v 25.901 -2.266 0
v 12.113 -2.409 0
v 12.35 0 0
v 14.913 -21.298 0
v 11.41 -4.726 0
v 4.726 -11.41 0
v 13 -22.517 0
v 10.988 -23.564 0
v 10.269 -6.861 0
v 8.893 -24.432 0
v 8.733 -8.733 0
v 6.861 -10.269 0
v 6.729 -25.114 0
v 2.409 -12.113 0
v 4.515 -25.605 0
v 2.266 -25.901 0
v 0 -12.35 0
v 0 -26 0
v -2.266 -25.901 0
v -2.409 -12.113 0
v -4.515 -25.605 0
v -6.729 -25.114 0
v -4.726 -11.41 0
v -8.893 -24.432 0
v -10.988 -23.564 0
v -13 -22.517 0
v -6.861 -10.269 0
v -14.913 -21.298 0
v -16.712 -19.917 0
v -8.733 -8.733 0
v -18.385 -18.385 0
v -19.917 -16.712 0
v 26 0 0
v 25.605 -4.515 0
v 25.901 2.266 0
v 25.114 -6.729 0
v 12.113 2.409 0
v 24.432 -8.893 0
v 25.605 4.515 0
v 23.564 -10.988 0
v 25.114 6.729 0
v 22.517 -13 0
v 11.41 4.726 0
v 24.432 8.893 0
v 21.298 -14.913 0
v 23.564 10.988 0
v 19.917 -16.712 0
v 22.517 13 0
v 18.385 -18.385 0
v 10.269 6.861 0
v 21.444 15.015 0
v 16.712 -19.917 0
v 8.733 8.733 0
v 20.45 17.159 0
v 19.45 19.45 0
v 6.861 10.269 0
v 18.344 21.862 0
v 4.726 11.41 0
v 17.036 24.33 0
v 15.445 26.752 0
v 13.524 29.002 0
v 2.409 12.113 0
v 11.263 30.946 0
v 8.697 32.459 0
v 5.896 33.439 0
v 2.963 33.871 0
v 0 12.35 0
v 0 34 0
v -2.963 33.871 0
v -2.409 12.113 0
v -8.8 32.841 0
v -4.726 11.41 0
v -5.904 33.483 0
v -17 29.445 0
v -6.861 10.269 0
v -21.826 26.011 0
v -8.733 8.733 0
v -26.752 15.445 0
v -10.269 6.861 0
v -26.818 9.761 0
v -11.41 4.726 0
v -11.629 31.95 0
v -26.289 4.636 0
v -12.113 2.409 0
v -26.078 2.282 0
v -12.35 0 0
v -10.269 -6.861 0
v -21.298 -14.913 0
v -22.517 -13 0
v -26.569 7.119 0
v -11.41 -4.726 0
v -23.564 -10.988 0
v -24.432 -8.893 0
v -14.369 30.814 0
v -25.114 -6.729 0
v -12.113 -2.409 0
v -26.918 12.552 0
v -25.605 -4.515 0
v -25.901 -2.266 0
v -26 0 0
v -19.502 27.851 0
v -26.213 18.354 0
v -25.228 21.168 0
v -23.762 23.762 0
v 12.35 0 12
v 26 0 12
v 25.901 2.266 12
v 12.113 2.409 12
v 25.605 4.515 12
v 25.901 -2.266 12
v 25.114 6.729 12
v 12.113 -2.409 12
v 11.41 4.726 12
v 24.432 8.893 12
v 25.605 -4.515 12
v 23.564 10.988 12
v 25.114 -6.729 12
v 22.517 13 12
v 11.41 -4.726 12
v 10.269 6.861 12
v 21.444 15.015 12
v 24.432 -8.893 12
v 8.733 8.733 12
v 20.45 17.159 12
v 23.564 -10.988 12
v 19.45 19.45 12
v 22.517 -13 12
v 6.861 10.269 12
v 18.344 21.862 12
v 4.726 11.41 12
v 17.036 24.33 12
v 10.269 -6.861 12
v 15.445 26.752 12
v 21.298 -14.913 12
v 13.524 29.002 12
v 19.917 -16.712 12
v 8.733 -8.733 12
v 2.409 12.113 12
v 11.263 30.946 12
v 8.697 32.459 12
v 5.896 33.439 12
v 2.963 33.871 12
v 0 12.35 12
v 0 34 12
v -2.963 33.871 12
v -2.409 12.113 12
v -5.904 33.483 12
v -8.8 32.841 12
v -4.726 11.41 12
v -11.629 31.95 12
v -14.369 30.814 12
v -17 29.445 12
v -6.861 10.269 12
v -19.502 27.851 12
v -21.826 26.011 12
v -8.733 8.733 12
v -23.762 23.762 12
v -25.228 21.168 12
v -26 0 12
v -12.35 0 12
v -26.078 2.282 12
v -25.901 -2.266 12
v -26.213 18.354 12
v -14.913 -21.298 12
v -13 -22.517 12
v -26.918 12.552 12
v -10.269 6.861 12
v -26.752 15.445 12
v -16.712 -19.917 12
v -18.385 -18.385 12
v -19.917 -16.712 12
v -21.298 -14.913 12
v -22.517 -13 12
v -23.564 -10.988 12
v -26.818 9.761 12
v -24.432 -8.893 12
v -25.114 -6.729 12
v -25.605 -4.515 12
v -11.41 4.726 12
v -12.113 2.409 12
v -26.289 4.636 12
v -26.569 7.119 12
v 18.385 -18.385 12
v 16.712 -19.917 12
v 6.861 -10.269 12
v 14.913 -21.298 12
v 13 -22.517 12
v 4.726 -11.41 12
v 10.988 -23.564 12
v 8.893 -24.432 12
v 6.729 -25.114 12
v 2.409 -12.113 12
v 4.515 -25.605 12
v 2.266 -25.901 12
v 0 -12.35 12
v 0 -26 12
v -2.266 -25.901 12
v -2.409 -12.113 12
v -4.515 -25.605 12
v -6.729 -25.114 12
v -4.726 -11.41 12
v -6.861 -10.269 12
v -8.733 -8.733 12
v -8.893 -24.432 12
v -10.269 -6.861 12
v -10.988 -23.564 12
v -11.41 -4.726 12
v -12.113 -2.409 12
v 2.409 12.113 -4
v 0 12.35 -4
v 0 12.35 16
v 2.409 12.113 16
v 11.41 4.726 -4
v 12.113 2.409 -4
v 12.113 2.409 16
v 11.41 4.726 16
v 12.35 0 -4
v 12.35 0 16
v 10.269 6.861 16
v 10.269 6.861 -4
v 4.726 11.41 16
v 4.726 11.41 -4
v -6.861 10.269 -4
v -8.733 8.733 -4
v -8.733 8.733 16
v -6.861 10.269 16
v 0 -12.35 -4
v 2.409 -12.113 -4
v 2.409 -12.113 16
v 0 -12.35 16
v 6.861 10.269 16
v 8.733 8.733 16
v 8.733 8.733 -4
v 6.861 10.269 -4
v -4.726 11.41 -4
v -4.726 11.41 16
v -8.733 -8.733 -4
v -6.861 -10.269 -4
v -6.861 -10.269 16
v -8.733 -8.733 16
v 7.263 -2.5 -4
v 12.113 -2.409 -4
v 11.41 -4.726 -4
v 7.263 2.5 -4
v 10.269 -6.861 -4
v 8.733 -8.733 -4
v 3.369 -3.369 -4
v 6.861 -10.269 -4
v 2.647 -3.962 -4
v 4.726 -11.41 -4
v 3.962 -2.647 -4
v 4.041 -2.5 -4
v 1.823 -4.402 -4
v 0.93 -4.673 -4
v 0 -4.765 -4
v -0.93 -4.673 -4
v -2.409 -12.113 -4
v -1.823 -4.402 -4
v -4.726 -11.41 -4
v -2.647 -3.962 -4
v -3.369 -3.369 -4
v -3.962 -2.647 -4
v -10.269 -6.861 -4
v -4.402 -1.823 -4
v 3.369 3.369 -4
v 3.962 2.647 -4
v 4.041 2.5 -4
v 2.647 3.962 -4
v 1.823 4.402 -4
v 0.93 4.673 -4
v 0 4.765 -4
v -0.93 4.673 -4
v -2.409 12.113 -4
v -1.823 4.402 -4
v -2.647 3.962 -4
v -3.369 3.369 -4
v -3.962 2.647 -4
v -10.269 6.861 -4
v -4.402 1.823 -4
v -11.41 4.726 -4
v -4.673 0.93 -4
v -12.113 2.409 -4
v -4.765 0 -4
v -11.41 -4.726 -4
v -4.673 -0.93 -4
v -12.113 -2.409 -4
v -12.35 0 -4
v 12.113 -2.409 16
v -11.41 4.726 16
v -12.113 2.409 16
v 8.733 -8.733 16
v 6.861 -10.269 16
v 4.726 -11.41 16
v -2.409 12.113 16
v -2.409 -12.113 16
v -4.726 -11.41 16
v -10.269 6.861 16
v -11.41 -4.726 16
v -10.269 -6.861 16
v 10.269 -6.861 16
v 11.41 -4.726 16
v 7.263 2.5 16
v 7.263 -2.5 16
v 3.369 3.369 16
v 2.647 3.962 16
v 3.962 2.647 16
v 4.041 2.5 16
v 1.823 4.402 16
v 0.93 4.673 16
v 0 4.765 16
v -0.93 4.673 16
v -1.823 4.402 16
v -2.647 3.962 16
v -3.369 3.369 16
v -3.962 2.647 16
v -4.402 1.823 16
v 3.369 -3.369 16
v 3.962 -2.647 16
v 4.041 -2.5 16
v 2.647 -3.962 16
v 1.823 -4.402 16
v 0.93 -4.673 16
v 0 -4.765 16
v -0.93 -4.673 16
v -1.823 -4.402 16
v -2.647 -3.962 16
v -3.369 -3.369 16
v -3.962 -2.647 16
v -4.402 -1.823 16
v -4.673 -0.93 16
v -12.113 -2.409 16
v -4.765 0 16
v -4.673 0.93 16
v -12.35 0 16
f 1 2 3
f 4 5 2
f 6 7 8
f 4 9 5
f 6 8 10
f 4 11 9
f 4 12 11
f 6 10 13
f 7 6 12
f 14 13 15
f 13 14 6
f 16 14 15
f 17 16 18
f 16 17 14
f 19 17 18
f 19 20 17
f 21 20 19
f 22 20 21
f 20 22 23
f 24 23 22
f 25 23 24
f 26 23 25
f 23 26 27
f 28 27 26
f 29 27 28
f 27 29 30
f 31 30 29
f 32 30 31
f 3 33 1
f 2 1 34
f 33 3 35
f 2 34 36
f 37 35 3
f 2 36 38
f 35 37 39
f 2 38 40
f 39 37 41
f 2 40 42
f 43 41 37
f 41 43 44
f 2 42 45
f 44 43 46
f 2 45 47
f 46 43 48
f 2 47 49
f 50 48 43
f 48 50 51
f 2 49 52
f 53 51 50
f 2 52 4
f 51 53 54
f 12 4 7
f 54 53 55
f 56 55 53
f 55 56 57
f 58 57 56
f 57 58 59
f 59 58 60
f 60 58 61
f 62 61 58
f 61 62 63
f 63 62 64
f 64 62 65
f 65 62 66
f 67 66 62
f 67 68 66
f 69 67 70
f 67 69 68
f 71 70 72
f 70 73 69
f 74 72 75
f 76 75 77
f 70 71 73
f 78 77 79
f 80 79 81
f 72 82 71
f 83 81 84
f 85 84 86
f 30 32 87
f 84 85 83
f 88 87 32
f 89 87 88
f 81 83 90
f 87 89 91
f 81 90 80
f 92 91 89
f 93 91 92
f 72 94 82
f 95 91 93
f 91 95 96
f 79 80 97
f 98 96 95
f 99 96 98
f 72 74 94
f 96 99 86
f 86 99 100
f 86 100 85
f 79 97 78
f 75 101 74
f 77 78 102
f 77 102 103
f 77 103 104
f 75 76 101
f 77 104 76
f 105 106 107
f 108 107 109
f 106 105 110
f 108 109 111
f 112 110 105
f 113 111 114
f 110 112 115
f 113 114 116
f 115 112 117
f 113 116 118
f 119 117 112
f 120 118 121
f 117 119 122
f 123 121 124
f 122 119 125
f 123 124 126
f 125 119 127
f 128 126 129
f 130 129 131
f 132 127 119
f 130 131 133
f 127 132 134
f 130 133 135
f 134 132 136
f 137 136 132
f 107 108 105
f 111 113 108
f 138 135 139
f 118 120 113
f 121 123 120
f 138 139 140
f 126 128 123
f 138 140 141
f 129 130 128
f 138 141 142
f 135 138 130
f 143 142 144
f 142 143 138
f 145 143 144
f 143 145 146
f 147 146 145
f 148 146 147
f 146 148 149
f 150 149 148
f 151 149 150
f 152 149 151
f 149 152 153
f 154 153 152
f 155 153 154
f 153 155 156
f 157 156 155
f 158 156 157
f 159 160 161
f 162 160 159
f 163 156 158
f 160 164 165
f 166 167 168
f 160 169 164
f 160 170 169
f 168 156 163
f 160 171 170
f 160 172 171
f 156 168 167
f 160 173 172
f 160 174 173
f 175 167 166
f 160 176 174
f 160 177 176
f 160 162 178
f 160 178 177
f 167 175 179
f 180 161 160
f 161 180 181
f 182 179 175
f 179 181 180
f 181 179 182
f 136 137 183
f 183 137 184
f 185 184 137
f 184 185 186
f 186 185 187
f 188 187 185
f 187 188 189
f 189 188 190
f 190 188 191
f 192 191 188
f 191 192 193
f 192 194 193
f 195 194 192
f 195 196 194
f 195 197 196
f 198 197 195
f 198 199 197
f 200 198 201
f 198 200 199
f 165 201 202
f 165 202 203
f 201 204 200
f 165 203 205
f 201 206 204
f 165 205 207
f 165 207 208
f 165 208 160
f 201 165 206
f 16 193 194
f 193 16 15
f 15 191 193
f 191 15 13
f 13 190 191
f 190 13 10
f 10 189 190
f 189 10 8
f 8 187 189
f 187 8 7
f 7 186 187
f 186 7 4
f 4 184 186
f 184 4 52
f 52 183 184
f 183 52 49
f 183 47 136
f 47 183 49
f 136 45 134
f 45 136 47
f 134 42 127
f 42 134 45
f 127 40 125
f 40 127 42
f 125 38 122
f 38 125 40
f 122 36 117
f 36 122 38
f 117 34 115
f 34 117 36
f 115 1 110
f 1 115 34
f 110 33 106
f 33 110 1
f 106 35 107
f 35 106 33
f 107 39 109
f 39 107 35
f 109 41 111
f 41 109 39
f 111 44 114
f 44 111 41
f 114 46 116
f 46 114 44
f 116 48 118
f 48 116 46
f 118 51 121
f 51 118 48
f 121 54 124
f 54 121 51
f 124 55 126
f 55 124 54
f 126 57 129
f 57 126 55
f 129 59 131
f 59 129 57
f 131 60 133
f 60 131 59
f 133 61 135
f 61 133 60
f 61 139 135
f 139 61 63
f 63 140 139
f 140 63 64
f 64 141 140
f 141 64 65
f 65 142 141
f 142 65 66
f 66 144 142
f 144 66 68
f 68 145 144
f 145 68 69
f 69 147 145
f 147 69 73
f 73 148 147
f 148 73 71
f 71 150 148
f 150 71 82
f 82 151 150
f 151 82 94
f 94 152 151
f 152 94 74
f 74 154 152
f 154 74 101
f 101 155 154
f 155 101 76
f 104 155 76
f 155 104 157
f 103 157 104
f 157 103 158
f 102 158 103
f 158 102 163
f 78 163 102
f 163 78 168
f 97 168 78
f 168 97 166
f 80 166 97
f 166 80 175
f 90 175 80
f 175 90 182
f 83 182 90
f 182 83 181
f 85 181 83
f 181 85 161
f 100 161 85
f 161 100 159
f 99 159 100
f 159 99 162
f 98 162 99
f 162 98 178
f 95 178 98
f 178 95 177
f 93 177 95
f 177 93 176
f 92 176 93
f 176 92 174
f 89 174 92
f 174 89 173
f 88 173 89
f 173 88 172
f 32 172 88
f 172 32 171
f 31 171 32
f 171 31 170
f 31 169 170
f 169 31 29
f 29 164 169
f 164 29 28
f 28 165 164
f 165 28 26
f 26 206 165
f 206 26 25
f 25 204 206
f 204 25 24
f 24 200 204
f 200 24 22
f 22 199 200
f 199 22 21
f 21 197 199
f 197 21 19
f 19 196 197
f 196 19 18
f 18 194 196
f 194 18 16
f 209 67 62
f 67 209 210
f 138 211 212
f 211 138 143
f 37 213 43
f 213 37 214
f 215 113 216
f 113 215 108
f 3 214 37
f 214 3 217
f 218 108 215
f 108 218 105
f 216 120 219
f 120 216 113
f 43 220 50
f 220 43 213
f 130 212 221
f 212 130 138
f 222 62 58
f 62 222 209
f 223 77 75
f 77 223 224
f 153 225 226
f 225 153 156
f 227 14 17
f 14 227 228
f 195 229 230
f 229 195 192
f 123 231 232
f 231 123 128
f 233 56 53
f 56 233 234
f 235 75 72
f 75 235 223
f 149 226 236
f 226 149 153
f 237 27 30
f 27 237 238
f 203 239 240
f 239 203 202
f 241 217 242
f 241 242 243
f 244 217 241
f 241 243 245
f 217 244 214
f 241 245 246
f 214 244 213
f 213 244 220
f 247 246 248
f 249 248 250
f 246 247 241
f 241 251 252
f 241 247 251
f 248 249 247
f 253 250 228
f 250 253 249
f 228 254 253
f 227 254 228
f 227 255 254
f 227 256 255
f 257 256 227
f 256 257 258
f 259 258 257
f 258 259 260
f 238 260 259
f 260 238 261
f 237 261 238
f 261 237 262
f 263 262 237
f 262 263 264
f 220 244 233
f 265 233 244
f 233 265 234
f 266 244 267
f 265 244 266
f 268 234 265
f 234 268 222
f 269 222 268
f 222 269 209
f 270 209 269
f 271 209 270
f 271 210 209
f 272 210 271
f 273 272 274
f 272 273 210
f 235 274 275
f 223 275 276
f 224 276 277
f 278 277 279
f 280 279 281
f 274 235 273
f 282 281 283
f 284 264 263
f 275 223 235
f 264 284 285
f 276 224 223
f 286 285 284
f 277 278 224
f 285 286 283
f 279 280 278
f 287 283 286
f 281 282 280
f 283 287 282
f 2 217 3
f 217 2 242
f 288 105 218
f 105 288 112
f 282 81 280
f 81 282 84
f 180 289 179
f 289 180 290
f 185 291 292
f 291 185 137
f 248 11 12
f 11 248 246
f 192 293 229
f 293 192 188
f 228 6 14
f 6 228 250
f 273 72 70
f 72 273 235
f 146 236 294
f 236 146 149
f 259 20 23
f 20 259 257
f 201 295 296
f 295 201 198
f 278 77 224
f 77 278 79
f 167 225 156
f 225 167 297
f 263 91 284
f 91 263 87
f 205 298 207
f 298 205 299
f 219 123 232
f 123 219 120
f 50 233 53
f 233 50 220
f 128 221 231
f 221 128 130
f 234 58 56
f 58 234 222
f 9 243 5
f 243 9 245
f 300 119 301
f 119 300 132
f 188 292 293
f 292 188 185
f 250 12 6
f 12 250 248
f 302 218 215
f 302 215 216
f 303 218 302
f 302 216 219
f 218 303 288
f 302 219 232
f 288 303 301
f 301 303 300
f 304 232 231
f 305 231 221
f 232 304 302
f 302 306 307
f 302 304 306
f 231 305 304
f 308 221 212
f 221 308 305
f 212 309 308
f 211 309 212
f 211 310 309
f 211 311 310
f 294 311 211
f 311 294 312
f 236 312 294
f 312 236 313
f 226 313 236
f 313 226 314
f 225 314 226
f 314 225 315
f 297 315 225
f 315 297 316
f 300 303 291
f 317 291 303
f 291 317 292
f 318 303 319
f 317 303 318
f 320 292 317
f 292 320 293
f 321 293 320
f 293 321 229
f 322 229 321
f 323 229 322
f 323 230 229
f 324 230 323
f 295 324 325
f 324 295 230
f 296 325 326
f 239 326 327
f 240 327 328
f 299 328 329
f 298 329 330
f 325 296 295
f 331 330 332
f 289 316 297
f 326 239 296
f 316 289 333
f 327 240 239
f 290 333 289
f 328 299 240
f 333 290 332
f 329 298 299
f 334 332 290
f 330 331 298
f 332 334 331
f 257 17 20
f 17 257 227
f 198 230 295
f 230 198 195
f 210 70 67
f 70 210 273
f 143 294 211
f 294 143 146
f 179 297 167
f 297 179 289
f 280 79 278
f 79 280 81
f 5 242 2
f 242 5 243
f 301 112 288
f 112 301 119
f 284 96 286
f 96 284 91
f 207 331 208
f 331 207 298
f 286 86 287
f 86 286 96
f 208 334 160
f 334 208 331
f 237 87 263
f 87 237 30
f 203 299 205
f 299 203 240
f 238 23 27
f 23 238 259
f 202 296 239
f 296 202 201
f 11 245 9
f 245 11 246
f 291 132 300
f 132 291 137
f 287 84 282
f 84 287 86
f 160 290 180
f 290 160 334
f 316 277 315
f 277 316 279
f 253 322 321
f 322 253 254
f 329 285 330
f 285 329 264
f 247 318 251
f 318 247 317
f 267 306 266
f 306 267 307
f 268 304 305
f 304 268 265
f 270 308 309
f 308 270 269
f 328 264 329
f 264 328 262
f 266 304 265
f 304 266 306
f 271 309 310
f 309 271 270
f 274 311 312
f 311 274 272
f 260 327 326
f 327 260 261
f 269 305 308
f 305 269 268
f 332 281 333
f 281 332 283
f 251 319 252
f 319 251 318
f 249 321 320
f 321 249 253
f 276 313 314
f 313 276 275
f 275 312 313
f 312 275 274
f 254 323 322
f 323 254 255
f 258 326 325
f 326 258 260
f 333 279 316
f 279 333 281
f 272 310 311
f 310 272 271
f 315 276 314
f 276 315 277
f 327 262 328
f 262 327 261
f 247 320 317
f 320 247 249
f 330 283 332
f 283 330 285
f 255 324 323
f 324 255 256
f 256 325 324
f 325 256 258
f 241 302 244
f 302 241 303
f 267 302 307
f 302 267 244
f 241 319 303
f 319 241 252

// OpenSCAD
$fn = 32;

// ----------------------------------------------------------------------
// Cam: base radius 26 mm with a 8 mm lift over 150 degrees
// ----------------------------------------------------------------------

// --- parameters (mm) ---
base_r = 26;              // base radius
lift = 8;                 // lift height above the base radius
lift_span = 150;          // angular width of the lift
lift_start = 30;          // angle where the lift starts
cam_t = 12;               // cam plate thickness
hub_d = 24.7;             // hub diameter
hub_h = 20;               // hub height
bore_d = 9.53;            // bore
key_w = 5;                // keyway width
key_depth = 2.5;          // keyway depth

cam_profile = [[26, 0], [25.901, 2.266], [25.605, 4.515], [25.114, 6.729], [24.432, 8.893], [23.564, 10.988], [22.517, 13], [21.444, 15.015], [20.45, 17.159], [19.45, 19.45], [18.344, 21.862], [17.036, 24.33], [15.445, 26.752], [13.524, 29.002], [11.263, 30.946], [8.697, 32.459], [5.896, 33.439], [2.963, 33.871], [0, 34], [-2.963, 33.871], [-5.904, 33.483], [-8.8, 32.841], [-11.629, 31.95], [-14.369, 30.814], [-17, 29.445], [-19.502, 27.851], [-21.826, 26.011], [-23.762, 23.762], [-25.228, 21.168], [-26.213, 18.354], [-26.752, 15.445], [-26.918, 12.552], [-26.818, 9.761], [-26.569, 7.119], [-26.289, 4.636], [-26.078, 2.282], [-26, 0], [-25.901, -2.266], [-25.605, -4.515], [-25.114, -6.729], [-24.432, -8.893], [-23.564, -10.988], [-22.517, -13], [-21.298, -14.913], [-19.917, -16.712], [-18.385, -18.385], [-16.712, -19.917], [-14.913, -21.298], [-13, -22.517], [-10.988, -23.564], [-8.893, -24.432], [-6.729, -25.114], [-4.515, -25.605], [-2.266, -25.901], [0, -26], [2.266, -25.901], [4.515, -25.605], [6.729, -25.114], [8.893, -24.432], [10.988, -23.564], [13, -22.517], [14.913, -21.298], [16.712, -19.917], [18.385, -18.385], [19.917, -16.712], [21.298, -14.913], [22.517, -13], [23.564, -10.988], [24.432, -8.893], [25.114, -6.729], [25.605, -4.515], [25.901, -2.266]];

difference() {
  union() {
    linear_extrude(height = cam_t) polygon(cam_profile);
    /* hub, proud of the cam plate on both sides */
    translate([0, 0, -4]) cylinder(h = hub_h, d = hub_d);
  }
  /* bore through the hub, 2.5 mm clear on both faces */
  translate([0, 0, -6.5]) cylinder(h = hub_h + 5, d = bore_d);
  /* keyway, milled through the whole hub */
  translate([2.263, -2.5, -6.5]) cube([5, 5, 25]);
}
